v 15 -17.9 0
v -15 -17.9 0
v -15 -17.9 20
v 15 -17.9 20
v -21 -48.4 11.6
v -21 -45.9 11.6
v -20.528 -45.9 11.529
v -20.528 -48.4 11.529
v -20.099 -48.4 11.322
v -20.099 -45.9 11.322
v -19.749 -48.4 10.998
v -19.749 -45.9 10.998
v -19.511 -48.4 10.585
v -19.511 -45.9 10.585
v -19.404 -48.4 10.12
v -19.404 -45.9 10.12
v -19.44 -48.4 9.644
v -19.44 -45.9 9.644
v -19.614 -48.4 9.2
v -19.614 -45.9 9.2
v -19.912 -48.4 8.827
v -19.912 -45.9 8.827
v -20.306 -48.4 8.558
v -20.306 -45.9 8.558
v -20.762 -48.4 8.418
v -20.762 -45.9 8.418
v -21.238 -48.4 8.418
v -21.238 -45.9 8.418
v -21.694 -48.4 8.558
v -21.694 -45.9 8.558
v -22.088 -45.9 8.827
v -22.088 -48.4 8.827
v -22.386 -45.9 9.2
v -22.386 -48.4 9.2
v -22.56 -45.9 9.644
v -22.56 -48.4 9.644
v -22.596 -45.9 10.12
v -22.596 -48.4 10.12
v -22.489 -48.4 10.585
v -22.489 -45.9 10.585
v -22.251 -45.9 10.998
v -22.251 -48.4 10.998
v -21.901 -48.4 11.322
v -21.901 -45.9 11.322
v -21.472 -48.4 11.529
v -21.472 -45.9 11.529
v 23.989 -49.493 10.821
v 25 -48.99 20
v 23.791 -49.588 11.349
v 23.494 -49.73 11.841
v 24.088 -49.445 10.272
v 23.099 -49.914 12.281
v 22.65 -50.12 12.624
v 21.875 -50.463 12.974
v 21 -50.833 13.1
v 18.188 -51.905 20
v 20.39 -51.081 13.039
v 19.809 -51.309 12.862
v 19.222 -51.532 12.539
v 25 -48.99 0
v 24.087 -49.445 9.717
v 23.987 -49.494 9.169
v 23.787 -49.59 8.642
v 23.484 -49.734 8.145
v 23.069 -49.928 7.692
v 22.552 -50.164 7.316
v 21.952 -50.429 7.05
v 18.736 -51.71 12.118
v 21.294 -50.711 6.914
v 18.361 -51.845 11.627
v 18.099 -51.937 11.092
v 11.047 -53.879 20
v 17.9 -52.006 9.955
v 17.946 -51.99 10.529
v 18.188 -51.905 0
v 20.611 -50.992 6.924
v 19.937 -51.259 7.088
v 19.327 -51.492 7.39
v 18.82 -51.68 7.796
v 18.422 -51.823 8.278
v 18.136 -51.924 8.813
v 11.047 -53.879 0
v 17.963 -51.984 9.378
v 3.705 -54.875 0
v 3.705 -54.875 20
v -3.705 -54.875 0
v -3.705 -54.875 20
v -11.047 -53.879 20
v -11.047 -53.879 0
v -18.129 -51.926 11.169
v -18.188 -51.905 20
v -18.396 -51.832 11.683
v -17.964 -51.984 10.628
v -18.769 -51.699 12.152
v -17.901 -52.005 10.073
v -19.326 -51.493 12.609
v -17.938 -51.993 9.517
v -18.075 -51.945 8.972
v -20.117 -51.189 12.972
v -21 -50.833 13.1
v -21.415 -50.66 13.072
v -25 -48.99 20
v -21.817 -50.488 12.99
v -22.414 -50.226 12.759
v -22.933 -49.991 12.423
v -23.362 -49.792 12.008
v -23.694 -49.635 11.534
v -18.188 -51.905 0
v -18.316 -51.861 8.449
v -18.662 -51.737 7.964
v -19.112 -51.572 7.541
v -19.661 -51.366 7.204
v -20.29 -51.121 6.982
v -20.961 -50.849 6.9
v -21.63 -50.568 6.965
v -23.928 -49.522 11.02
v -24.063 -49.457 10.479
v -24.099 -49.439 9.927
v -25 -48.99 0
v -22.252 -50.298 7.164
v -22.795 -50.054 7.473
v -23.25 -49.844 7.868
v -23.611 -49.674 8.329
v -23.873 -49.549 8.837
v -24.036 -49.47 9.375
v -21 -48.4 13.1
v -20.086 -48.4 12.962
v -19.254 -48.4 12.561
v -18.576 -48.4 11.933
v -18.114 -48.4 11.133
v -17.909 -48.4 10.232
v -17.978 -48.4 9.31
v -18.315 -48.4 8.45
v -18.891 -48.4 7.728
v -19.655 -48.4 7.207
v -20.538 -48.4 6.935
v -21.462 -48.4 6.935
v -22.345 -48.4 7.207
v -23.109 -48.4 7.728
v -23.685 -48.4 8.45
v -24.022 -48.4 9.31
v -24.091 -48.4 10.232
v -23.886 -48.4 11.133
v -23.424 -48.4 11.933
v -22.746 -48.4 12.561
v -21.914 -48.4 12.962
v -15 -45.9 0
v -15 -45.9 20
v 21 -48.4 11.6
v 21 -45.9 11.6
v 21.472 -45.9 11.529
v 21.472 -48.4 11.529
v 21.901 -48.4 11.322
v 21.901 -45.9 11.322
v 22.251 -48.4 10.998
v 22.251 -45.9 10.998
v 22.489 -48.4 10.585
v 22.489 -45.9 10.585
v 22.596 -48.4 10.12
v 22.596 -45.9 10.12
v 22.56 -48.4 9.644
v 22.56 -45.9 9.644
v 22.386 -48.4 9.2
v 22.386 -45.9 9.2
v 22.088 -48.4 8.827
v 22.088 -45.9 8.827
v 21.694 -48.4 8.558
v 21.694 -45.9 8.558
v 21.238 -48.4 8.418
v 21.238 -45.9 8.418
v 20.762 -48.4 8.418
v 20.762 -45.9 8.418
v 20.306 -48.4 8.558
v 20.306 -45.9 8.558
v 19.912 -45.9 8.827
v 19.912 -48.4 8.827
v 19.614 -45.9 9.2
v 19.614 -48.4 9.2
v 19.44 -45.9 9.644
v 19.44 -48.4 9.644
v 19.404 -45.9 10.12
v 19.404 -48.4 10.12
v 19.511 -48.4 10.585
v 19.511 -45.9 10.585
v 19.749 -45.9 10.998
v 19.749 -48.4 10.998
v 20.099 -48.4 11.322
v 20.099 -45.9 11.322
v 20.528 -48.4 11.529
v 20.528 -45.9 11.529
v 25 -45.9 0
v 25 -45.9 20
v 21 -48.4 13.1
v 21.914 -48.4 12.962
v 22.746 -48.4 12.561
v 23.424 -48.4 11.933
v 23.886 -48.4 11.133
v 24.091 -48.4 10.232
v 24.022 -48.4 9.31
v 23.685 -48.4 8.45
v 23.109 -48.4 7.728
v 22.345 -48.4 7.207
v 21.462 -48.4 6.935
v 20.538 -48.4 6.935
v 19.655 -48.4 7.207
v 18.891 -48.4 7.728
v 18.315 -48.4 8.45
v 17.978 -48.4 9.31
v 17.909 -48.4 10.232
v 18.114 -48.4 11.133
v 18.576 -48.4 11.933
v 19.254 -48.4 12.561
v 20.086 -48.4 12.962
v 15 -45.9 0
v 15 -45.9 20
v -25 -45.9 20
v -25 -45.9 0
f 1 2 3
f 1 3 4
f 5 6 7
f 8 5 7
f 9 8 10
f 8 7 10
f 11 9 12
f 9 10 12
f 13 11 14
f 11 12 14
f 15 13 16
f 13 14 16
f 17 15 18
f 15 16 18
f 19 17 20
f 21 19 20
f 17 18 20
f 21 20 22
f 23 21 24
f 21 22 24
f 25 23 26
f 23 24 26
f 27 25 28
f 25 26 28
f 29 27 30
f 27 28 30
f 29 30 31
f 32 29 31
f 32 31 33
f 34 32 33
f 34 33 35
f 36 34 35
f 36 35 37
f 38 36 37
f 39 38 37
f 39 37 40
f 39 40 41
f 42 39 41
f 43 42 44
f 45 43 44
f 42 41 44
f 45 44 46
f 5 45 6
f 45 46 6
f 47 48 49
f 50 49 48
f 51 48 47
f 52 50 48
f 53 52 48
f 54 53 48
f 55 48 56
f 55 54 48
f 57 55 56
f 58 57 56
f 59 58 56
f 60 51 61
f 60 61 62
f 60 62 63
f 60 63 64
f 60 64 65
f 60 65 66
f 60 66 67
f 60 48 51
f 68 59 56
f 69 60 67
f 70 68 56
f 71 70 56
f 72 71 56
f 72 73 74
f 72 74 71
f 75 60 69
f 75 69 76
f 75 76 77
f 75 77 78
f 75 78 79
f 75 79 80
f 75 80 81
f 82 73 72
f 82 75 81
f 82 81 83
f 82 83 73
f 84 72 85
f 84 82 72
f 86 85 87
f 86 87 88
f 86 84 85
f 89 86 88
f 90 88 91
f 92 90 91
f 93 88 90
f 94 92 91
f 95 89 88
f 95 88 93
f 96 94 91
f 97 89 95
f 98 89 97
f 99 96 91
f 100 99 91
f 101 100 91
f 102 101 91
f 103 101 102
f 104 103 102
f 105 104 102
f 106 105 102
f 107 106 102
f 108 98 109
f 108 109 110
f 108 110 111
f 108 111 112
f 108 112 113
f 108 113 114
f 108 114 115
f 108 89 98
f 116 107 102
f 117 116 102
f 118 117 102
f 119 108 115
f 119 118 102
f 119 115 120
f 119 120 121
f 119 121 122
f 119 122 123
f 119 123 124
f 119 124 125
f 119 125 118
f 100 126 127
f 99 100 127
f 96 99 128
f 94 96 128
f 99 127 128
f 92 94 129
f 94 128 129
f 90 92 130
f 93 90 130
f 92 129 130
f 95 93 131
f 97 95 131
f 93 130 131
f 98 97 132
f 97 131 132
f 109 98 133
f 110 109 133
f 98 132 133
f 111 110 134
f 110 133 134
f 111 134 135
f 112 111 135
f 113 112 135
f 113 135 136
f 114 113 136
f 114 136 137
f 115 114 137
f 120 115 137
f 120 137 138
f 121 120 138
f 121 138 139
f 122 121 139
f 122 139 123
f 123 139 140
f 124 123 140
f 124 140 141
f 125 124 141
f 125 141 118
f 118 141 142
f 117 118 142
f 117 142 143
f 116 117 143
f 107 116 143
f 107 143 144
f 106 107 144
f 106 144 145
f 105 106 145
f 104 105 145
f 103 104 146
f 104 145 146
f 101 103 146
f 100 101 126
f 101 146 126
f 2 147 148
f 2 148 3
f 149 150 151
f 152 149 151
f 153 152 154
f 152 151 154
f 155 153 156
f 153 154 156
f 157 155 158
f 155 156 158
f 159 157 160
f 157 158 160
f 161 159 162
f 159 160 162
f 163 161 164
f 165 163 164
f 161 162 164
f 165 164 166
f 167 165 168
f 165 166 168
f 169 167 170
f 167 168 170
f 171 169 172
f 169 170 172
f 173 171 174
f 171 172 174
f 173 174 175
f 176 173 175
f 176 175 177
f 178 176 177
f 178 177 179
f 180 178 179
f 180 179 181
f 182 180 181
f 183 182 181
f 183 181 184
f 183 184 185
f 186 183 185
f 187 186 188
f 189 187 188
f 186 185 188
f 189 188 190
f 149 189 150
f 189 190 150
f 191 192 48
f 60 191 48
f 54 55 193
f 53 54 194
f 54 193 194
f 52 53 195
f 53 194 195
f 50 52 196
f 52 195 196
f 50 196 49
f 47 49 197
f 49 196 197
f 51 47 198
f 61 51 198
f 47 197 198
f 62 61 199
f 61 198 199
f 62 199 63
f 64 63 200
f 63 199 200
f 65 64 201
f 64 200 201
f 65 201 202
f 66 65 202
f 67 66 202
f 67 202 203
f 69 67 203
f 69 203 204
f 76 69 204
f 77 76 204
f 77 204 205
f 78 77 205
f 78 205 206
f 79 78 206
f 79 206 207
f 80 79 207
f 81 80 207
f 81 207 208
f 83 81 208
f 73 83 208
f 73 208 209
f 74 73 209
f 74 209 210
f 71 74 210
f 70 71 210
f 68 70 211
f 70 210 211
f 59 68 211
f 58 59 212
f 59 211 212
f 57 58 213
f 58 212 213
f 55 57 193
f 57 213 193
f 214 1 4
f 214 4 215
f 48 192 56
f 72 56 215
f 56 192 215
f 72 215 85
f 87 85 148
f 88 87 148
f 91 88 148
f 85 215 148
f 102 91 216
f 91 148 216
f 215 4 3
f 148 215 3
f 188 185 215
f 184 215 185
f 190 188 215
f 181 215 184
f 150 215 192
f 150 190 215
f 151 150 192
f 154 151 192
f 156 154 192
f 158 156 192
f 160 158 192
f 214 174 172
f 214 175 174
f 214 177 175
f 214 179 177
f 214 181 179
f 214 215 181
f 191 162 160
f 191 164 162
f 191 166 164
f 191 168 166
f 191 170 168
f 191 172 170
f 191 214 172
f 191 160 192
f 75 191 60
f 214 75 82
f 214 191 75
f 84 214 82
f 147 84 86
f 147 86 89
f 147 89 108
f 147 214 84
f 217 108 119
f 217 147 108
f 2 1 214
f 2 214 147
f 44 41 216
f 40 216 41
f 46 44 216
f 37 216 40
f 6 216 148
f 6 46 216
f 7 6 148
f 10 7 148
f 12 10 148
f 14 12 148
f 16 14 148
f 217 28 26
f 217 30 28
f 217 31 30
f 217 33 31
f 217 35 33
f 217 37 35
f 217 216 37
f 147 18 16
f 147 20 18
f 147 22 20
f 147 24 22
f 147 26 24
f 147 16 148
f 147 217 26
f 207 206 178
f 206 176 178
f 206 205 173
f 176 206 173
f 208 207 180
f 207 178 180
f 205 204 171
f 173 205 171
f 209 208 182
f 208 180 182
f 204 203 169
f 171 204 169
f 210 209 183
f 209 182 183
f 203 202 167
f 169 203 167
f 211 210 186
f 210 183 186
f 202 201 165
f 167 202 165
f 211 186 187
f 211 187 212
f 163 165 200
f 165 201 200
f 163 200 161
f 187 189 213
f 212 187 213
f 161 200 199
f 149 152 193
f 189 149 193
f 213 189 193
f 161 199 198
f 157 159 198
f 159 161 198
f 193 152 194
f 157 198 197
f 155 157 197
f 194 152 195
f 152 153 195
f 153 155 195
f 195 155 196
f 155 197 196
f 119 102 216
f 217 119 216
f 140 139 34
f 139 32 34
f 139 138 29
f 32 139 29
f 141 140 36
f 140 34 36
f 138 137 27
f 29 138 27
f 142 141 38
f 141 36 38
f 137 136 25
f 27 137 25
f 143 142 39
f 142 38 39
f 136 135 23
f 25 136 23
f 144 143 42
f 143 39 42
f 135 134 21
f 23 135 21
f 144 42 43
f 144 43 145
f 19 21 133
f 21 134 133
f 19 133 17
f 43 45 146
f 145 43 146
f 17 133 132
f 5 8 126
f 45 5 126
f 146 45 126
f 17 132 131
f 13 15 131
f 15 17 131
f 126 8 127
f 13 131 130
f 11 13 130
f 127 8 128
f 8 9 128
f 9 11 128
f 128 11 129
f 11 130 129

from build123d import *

# Parameters (mm, degrees)
RESSALTO_EXTRUS_O2_DEPTH   = 20
ESBO_O2_R                  = 1.6
CORTE_EXTRUS_O1_DEPTH      = 2.5
CORTE_EXTRUS_O2_REACH      = 46.218
CORTE_EXTRUS_O2_END_RADIUS = 55
ESBO_O3_R                  = 3.1


with BuildPart() as part:
    # Esboço1 → Ressalto-extrusão2 (new body)
    with BuildSketch(Plane.XY):
        with BuildLine():
            Line((-15, -45.899794856), (-15, -17.899794856))
            Line((-15, -17.899794856), (15, -17.899794856))
            Line((15, -17.899794856), (15, -45.899794856))
            Line((15, -45.899794856), (25, -45.899794856))
            Line((25, -45.899794856), (25, -48.989794856))
            ThreePointArc((25, -48.989794856), (0, -55), (-25, -48.989794856))
            Line((-25, -48.989794856), (-25, -45.899794856))
            Line((-25, -45.899794856), (-15, -45.899794856))
        make_face()
    extrude(amount=RESSALTO_EXTRUS_O2_DEPTH)

    # Esboço2 → Corte-extrusão1 (cut)
    with BuildSketch(Plane(origin=(0, -45.899794856, 0), x_dir=(1, 0, 0), z_dir=(0, 1, 0))):
        with Locations(Location((-21, -10, 0), (0, 0, 270))):
            Circle(ESBO_O2_R)
        with Locations(Location((21, -10, 0), (0, 0, 270))):
            Circle(ESBO_O2_R)
    extrude(amount=-CORTE_EXTRUS_O1_DEPTH, mode=Mode.SUBTRACT)

    # Corte-extrusão2: up to this cylinder (the profile starts inside it)
    corte_extrus_o2_end = Plane(origin=(0, 0, 10), z_dir=(0, 0, -1)) * Cylinder(CORTE_EXTRUS_O2_END_RADIUS, 203.436, mode=Mode.PRIVATE)
    # Esboço3 → Corte-extrusão2 (cut, up to the surface)
    with BuildSketch(Plane(origin=(0, -48.399794856, 0), x_dir=(1, 0, 0), z_dir=(0, 1, 0)), mode=Mode.PRIVATE) as corte_extrus_o2_sk1:
        with Locations(Location((-21, -10, 0), (0, 0, 270))):
            Circle(ESBO_O3_R)
    corte_extrus_o2_tool1 = extrude(corte_extrus_o2_sk1.sketch, amount=-CORTE_EXTRUS_O2_REACH, mode=Mode.PRIVATE) & corte_extrus_o2_end
    add(corte_extrus_o2_tool1.solids().sort_by_distance((-21, -48.399795, 10))[0], mode=Mode.SUBTRACT)
    # Esboço3 → Corte-extrusão2 (cut, up to the surface)
    with BuildSketch(Plane(origin=(0, -48.399794856, 0), x_dir=(1, 0, 0), z_dir=(0, 1, 0)), mode=Mode.PRIVATE) as corte_extrus_o2_sk2:
        with Locations(Location((21, -10, 0), (0, 0, 270))):
            Circle(ESBO_O3_R)
    corte_extrus_o2_tool2 = extrude(corte_extrus_o2_sk2.sketch, amount=-CORTE_EXTRUS_O2_REACH, mode=Mode.PRIVATE) & corte_extrus_o2_end
    add(corte_extrus_o2_tool2.solids().sort_by_distance((21, -48.399795, 10))[0], mode=Mode.SUBTRACT)


solid = part.part
